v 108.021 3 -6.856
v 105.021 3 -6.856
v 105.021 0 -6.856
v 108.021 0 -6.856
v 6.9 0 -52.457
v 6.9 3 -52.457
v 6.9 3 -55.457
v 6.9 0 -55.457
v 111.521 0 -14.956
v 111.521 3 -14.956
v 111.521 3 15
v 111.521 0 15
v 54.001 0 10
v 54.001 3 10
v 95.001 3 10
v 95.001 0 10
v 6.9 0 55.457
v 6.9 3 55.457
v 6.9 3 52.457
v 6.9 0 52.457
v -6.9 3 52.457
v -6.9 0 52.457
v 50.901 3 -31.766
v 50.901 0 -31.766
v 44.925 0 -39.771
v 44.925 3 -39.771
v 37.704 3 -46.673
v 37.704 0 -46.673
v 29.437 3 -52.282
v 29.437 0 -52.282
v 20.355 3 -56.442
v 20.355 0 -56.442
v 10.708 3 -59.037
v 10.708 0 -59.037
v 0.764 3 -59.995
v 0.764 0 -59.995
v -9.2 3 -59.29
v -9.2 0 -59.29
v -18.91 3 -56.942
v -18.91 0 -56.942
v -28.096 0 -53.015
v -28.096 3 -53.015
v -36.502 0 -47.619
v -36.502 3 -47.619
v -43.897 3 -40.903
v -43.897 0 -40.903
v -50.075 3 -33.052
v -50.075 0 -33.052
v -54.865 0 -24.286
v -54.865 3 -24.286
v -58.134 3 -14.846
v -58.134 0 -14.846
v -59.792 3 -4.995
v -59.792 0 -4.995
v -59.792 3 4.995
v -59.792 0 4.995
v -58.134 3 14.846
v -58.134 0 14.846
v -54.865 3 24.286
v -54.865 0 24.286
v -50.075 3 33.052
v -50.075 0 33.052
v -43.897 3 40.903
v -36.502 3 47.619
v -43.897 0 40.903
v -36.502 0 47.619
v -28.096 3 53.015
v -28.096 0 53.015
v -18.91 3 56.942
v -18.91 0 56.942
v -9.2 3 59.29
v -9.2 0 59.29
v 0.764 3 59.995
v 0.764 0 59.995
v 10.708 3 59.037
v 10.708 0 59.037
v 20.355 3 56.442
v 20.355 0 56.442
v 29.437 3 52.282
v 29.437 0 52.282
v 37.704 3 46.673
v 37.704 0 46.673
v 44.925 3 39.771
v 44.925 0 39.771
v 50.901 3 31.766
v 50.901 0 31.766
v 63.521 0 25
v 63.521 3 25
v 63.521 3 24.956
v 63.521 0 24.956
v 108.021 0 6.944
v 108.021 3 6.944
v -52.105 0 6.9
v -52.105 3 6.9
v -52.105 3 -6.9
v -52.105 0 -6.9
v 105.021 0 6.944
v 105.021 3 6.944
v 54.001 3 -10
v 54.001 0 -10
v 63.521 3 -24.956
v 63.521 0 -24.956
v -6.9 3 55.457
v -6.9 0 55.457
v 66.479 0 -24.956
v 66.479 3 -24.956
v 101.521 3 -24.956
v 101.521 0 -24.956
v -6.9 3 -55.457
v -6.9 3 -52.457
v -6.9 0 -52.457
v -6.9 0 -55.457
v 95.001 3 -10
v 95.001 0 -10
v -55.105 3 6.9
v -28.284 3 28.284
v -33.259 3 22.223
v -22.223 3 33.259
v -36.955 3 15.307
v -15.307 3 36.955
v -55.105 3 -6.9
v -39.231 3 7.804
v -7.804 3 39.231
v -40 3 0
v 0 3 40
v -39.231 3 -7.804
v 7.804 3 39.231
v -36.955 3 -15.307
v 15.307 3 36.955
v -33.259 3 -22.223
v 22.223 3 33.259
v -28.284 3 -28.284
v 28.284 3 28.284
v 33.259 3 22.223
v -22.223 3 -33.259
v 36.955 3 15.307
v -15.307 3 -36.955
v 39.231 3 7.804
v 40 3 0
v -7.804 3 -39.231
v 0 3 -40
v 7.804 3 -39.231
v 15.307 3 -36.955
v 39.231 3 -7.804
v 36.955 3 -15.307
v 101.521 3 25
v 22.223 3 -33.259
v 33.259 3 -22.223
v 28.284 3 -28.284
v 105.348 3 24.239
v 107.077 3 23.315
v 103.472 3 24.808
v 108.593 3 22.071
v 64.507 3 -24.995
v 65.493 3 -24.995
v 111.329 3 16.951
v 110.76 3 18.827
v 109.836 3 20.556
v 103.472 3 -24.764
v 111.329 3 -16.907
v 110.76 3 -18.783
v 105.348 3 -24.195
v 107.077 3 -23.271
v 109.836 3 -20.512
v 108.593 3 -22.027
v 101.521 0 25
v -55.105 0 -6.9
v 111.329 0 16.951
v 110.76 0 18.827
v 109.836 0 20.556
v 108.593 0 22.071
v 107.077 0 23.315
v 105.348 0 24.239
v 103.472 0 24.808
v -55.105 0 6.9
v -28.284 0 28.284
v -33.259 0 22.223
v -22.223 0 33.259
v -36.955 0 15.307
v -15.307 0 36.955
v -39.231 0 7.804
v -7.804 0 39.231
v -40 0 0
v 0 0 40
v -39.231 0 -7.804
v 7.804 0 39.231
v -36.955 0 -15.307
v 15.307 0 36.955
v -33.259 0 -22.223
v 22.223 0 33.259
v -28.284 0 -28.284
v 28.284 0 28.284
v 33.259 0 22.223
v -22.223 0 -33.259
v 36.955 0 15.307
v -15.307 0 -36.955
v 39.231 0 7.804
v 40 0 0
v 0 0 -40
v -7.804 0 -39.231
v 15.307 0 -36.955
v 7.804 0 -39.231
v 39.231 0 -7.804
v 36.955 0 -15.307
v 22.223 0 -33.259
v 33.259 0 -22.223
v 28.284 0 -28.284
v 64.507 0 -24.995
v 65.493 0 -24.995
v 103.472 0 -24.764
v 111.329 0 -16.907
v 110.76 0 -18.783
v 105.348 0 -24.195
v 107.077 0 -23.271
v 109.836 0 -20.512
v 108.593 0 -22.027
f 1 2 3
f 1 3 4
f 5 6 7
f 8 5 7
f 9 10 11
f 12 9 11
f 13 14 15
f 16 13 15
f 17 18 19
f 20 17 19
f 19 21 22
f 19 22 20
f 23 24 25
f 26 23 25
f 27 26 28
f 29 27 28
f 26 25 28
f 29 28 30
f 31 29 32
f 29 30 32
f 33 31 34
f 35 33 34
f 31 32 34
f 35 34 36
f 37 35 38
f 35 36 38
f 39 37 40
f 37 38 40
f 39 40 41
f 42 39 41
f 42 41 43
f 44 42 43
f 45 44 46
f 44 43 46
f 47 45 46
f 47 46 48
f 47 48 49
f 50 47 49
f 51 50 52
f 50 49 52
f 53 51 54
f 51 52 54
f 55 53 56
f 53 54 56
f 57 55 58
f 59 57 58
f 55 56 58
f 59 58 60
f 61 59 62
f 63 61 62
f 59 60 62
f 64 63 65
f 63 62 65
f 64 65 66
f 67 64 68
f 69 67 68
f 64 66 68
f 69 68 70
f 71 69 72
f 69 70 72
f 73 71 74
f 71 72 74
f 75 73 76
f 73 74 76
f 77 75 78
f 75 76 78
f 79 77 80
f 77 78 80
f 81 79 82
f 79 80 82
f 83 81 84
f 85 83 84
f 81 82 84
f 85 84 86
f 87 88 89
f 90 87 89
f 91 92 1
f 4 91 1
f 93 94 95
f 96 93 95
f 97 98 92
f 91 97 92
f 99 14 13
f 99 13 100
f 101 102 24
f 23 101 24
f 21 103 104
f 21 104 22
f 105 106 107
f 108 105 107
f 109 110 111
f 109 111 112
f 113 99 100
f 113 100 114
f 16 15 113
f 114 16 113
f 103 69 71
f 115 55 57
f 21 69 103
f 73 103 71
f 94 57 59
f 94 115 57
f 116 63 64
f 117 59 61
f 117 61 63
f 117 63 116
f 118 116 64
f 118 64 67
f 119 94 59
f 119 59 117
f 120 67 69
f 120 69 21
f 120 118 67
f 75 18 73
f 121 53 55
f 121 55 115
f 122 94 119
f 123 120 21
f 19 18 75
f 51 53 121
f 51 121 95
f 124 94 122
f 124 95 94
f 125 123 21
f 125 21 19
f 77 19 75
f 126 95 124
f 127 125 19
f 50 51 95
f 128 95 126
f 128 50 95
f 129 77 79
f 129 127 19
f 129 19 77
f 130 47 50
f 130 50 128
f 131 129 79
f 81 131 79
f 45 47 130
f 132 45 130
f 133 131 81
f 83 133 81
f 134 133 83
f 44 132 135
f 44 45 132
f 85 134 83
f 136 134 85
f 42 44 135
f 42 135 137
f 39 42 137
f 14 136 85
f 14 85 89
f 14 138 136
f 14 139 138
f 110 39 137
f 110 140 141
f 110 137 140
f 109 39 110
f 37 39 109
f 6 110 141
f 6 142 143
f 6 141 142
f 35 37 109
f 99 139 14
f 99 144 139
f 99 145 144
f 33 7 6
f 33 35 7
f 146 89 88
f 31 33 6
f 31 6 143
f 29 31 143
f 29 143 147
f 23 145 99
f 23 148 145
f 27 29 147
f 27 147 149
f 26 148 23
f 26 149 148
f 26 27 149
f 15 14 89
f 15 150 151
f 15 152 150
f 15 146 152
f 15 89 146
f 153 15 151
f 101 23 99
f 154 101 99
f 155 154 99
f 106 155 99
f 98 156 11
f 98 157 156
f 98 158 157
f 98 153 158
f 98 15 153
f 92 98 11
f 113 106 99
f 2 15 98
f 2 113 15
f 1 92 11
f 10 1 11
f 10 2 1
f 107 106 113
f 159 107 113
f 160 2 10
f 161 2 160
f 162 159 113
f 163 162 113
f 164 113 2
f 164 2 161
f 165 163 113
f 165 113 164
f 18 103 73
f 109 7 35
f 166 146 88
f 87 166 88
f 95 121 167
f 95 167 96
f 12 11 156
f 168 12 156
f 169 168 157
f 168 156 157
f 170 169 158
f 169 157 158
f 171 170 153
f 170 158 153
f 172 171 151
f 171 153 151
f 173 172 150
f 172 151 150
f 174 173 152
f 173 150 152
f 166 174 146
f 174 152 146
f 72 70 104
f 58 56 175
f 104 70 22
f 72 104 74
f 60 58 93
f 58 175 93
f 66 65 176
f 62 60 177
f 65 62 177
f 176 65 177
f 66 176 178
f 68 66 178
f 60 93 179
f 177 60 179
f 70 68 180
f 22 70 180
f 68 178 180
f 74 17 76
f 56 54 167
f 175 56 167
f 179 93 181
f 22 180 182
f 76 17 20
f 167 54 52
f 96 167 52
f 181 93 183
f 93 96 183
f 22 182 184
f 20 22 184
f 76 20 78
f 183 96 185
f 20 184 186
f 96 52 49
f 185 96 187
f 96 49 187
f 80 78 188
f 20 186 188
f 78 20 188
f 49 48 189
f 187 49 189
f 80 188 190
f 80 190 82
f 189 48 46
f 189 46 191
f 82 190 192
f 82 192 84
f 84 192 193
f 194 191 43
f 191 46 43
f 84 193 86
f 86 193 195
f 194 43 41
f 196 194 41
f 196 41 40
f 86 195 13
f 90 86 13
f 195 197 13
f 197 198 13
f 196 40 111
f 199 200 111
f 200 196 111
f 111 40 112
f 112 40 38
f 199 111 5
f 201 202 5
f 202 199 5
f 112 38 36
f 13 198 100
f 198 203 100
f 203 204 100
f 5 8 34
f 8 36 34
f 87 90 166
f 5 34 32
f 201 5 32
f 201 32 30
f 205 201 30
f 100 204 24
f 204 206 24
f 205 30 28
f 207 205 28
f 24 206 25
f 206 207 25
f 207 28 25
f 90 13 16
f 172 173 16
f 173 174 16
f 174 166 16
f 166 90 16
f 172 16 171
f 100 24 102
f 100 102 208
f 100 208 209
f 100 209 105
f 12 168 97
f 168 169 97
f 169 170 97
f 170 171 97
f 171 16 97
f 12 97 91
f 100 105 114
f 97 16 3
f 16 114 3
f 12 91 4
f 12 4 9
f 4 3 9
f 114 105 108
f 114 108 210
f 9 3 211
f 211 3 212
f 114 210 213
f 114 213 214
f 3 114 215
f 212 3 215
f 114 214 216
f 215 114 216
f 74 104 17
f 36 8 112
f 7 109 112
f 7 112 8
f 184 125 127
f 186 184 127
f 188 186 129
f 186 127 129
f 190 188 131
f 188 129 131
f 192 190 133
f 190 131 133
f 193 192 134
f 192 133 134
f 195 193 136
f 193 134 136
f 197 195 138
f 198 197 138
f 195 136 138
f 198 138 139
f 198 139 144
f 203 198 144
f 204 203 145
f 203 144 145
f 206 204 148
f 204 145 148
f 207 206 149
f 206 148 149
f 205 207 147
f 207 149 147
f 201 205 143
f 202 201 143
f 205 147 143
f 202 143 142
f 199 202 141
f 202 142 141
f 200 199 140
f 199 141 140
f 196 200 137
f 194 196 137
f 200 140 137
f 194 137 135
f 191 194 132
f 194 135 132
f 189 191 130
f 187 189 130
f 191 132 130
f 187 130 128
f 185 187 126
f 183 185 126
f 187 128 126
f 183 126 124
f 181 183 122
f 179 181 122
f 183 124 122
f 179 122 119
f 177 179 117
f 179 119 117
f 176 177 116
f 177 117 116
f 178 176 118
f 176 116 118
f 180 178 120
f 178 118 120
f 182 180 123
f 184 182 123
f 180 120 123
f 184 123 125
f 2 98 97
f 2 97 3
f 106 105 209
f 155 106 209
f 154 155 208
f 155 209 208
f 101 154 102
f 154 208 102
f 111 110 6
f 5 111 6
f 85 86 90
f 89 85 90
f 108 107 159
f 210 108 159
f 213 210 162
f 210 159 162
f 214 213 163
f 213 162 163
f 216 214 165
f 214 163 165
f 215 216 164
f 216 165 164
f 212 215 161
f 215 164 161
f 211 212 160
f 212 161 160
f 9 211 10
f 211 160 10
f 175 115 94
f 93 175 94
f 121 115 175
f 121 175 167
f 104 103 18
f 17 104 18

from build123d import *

# Parameters (mm, degrees)
EXTRUDE_1_DEPTH     = 3
SKETCH_3_W          = 13.8
SKETCH_3_H          = 3
SKETCH_3_W_2        = 3
SKETCH_3_H_2        = 13.8
CUT_EXTRUDE_1_DEPTH = 10
EXTRUDE_2_DEPTH     = 3
SKETCH_5_W          = 3
SKETCH_5_H          = 13.8
CUT_EXTRUDE_2_DEPTH = 20
SKETCH_6_W          = 41
SKETCH_6_H          = 20
CUT_EXTRUDE_3_DEPTH = 10
SKETCH_7_R          = 40
CUT_EXTRUDE_4_DEPTH = 3


with BuildPart() as part:
    # Эскиз2 → Бобышка-Вытянуть1 (new body)
    with BuildSketch(Plane(origin=(0, 0, 0), x_dir=(1, 0, 0), z_dir=(0, 1, 0))):
        with BuildLine():
            Line((50.901300831, -31.765666587), (63.52144012, -24.956238913))
            ThreePointArc((63.52144012, -24.956238913), (90, 0), (63.52144012, 24.956238913))
            Line((63.52144012, 24.956238913), (50.901300831, 31.765666587))
            ThreePointArc((50.901300831, 31.765666587), (-60, 0), (50.901300831, -31.765666587))
        make_face()
    extrude(amount=EXTRUDE_1_DEPTH)

    # Эскиз3 → Вырез-Вытянуть1 (cut)
    with BuildSketch(Plane(origin=(0, 3, 0), x_dir=(1, 0, 0), z_dir=(0, 1, 0))):
        with Locations((0, 53.956851754)):
            Rectangle(SKETCH_3_W, SKETCH_3_H)
        with Locations((0, -53.956851754)):
            Rectangle(SKETCH_3_W, SKETCH_3_H)
        with Locations((-53.60522772, 0)):
            Rectangle(SKETCH_3_W_2, SKETCH_3_H_2)
        with Locations((84.05982534, 0)):
            Rectangle(SKETCH_3_W_2, SKETCH_3_H_2)
    extrude(amount=-CUT_EXTRUDE_1_DEPTH, mode=Mode.SUBTRACT)

    # Эскиз4 → Бобышка-Вытянуть2 (add)
    with BuildSketch(Plane(origin=(0, 3, 0), x_dir=(1, 0, 0), z_dir=(0, 1, 0))):
        with BuildLine():
            Line((63.52144012, 24.956238913), (101.52144012, 24.956238913))
            ThreePointArc((101.52144012, 24.956238913), (108.592507932, 22.027306725), (111.52144012, 14.956238913))
            Line((111.52144012, 14.956238913), (111.52144012, -15))
            ThreePointArc((111.52144012, -15), (108.592507932, -22.071067812), (101.52144012, -25))
            Line((101.52144012, -25), (63.52144012, -25))
            Line((63.52144012, -25), (63.52144012, 24.956238913))
        make_face()
    extrude(amount=-EXTRUDE_2_DEPTH)

    # Эскиз5 → Вырез-Вытянуть2 (cut)
    with BuildSketch(Plane(origin=(0, 3, 0), x_dir=(1, 0, 0), z_dir=(0, 1, 0))):
        with Locations((106.52144012, -0.043761087)):
            Rectangle(SKETCH_5_W, SKETCH_5_H)
    extrude(amount=-CUT_EXTRUDE_2_DEPTH, mode=Mode.SUBTRACT)

    # Эскиз6 → Вырез-Вытянуть3 (cut)
    with BuildSketch(Plane(origin=(0, 3, 0), x_dir=(1, 0, 0), z_dir=(0, 1, 0))):
        with Locations((74.50144012, 0)):
            Rectangle(SKETCH_6_W, SKETCH_6_H)
    extrude(amount=-CUT_EXTRUDE_3_DEPTH, mode=Mode.SUBTRACT)

    # Эскиз7 → Вырез-Вытянуть4 (cut)
    with BuildSketch(Plane(origin=(0, 3, 0), x_dir=(1, 0, 0), z_dir=(0, 1, 0))):
        with Locations(Location((0, 0, 0), (0, 0, 270))):
            Circle(SKETCH_7_R)
    extrude(amount=-CUT_EXTRUDE_4_DEPTH, mode=Mode.SUBTRACT)


solid = part.part
